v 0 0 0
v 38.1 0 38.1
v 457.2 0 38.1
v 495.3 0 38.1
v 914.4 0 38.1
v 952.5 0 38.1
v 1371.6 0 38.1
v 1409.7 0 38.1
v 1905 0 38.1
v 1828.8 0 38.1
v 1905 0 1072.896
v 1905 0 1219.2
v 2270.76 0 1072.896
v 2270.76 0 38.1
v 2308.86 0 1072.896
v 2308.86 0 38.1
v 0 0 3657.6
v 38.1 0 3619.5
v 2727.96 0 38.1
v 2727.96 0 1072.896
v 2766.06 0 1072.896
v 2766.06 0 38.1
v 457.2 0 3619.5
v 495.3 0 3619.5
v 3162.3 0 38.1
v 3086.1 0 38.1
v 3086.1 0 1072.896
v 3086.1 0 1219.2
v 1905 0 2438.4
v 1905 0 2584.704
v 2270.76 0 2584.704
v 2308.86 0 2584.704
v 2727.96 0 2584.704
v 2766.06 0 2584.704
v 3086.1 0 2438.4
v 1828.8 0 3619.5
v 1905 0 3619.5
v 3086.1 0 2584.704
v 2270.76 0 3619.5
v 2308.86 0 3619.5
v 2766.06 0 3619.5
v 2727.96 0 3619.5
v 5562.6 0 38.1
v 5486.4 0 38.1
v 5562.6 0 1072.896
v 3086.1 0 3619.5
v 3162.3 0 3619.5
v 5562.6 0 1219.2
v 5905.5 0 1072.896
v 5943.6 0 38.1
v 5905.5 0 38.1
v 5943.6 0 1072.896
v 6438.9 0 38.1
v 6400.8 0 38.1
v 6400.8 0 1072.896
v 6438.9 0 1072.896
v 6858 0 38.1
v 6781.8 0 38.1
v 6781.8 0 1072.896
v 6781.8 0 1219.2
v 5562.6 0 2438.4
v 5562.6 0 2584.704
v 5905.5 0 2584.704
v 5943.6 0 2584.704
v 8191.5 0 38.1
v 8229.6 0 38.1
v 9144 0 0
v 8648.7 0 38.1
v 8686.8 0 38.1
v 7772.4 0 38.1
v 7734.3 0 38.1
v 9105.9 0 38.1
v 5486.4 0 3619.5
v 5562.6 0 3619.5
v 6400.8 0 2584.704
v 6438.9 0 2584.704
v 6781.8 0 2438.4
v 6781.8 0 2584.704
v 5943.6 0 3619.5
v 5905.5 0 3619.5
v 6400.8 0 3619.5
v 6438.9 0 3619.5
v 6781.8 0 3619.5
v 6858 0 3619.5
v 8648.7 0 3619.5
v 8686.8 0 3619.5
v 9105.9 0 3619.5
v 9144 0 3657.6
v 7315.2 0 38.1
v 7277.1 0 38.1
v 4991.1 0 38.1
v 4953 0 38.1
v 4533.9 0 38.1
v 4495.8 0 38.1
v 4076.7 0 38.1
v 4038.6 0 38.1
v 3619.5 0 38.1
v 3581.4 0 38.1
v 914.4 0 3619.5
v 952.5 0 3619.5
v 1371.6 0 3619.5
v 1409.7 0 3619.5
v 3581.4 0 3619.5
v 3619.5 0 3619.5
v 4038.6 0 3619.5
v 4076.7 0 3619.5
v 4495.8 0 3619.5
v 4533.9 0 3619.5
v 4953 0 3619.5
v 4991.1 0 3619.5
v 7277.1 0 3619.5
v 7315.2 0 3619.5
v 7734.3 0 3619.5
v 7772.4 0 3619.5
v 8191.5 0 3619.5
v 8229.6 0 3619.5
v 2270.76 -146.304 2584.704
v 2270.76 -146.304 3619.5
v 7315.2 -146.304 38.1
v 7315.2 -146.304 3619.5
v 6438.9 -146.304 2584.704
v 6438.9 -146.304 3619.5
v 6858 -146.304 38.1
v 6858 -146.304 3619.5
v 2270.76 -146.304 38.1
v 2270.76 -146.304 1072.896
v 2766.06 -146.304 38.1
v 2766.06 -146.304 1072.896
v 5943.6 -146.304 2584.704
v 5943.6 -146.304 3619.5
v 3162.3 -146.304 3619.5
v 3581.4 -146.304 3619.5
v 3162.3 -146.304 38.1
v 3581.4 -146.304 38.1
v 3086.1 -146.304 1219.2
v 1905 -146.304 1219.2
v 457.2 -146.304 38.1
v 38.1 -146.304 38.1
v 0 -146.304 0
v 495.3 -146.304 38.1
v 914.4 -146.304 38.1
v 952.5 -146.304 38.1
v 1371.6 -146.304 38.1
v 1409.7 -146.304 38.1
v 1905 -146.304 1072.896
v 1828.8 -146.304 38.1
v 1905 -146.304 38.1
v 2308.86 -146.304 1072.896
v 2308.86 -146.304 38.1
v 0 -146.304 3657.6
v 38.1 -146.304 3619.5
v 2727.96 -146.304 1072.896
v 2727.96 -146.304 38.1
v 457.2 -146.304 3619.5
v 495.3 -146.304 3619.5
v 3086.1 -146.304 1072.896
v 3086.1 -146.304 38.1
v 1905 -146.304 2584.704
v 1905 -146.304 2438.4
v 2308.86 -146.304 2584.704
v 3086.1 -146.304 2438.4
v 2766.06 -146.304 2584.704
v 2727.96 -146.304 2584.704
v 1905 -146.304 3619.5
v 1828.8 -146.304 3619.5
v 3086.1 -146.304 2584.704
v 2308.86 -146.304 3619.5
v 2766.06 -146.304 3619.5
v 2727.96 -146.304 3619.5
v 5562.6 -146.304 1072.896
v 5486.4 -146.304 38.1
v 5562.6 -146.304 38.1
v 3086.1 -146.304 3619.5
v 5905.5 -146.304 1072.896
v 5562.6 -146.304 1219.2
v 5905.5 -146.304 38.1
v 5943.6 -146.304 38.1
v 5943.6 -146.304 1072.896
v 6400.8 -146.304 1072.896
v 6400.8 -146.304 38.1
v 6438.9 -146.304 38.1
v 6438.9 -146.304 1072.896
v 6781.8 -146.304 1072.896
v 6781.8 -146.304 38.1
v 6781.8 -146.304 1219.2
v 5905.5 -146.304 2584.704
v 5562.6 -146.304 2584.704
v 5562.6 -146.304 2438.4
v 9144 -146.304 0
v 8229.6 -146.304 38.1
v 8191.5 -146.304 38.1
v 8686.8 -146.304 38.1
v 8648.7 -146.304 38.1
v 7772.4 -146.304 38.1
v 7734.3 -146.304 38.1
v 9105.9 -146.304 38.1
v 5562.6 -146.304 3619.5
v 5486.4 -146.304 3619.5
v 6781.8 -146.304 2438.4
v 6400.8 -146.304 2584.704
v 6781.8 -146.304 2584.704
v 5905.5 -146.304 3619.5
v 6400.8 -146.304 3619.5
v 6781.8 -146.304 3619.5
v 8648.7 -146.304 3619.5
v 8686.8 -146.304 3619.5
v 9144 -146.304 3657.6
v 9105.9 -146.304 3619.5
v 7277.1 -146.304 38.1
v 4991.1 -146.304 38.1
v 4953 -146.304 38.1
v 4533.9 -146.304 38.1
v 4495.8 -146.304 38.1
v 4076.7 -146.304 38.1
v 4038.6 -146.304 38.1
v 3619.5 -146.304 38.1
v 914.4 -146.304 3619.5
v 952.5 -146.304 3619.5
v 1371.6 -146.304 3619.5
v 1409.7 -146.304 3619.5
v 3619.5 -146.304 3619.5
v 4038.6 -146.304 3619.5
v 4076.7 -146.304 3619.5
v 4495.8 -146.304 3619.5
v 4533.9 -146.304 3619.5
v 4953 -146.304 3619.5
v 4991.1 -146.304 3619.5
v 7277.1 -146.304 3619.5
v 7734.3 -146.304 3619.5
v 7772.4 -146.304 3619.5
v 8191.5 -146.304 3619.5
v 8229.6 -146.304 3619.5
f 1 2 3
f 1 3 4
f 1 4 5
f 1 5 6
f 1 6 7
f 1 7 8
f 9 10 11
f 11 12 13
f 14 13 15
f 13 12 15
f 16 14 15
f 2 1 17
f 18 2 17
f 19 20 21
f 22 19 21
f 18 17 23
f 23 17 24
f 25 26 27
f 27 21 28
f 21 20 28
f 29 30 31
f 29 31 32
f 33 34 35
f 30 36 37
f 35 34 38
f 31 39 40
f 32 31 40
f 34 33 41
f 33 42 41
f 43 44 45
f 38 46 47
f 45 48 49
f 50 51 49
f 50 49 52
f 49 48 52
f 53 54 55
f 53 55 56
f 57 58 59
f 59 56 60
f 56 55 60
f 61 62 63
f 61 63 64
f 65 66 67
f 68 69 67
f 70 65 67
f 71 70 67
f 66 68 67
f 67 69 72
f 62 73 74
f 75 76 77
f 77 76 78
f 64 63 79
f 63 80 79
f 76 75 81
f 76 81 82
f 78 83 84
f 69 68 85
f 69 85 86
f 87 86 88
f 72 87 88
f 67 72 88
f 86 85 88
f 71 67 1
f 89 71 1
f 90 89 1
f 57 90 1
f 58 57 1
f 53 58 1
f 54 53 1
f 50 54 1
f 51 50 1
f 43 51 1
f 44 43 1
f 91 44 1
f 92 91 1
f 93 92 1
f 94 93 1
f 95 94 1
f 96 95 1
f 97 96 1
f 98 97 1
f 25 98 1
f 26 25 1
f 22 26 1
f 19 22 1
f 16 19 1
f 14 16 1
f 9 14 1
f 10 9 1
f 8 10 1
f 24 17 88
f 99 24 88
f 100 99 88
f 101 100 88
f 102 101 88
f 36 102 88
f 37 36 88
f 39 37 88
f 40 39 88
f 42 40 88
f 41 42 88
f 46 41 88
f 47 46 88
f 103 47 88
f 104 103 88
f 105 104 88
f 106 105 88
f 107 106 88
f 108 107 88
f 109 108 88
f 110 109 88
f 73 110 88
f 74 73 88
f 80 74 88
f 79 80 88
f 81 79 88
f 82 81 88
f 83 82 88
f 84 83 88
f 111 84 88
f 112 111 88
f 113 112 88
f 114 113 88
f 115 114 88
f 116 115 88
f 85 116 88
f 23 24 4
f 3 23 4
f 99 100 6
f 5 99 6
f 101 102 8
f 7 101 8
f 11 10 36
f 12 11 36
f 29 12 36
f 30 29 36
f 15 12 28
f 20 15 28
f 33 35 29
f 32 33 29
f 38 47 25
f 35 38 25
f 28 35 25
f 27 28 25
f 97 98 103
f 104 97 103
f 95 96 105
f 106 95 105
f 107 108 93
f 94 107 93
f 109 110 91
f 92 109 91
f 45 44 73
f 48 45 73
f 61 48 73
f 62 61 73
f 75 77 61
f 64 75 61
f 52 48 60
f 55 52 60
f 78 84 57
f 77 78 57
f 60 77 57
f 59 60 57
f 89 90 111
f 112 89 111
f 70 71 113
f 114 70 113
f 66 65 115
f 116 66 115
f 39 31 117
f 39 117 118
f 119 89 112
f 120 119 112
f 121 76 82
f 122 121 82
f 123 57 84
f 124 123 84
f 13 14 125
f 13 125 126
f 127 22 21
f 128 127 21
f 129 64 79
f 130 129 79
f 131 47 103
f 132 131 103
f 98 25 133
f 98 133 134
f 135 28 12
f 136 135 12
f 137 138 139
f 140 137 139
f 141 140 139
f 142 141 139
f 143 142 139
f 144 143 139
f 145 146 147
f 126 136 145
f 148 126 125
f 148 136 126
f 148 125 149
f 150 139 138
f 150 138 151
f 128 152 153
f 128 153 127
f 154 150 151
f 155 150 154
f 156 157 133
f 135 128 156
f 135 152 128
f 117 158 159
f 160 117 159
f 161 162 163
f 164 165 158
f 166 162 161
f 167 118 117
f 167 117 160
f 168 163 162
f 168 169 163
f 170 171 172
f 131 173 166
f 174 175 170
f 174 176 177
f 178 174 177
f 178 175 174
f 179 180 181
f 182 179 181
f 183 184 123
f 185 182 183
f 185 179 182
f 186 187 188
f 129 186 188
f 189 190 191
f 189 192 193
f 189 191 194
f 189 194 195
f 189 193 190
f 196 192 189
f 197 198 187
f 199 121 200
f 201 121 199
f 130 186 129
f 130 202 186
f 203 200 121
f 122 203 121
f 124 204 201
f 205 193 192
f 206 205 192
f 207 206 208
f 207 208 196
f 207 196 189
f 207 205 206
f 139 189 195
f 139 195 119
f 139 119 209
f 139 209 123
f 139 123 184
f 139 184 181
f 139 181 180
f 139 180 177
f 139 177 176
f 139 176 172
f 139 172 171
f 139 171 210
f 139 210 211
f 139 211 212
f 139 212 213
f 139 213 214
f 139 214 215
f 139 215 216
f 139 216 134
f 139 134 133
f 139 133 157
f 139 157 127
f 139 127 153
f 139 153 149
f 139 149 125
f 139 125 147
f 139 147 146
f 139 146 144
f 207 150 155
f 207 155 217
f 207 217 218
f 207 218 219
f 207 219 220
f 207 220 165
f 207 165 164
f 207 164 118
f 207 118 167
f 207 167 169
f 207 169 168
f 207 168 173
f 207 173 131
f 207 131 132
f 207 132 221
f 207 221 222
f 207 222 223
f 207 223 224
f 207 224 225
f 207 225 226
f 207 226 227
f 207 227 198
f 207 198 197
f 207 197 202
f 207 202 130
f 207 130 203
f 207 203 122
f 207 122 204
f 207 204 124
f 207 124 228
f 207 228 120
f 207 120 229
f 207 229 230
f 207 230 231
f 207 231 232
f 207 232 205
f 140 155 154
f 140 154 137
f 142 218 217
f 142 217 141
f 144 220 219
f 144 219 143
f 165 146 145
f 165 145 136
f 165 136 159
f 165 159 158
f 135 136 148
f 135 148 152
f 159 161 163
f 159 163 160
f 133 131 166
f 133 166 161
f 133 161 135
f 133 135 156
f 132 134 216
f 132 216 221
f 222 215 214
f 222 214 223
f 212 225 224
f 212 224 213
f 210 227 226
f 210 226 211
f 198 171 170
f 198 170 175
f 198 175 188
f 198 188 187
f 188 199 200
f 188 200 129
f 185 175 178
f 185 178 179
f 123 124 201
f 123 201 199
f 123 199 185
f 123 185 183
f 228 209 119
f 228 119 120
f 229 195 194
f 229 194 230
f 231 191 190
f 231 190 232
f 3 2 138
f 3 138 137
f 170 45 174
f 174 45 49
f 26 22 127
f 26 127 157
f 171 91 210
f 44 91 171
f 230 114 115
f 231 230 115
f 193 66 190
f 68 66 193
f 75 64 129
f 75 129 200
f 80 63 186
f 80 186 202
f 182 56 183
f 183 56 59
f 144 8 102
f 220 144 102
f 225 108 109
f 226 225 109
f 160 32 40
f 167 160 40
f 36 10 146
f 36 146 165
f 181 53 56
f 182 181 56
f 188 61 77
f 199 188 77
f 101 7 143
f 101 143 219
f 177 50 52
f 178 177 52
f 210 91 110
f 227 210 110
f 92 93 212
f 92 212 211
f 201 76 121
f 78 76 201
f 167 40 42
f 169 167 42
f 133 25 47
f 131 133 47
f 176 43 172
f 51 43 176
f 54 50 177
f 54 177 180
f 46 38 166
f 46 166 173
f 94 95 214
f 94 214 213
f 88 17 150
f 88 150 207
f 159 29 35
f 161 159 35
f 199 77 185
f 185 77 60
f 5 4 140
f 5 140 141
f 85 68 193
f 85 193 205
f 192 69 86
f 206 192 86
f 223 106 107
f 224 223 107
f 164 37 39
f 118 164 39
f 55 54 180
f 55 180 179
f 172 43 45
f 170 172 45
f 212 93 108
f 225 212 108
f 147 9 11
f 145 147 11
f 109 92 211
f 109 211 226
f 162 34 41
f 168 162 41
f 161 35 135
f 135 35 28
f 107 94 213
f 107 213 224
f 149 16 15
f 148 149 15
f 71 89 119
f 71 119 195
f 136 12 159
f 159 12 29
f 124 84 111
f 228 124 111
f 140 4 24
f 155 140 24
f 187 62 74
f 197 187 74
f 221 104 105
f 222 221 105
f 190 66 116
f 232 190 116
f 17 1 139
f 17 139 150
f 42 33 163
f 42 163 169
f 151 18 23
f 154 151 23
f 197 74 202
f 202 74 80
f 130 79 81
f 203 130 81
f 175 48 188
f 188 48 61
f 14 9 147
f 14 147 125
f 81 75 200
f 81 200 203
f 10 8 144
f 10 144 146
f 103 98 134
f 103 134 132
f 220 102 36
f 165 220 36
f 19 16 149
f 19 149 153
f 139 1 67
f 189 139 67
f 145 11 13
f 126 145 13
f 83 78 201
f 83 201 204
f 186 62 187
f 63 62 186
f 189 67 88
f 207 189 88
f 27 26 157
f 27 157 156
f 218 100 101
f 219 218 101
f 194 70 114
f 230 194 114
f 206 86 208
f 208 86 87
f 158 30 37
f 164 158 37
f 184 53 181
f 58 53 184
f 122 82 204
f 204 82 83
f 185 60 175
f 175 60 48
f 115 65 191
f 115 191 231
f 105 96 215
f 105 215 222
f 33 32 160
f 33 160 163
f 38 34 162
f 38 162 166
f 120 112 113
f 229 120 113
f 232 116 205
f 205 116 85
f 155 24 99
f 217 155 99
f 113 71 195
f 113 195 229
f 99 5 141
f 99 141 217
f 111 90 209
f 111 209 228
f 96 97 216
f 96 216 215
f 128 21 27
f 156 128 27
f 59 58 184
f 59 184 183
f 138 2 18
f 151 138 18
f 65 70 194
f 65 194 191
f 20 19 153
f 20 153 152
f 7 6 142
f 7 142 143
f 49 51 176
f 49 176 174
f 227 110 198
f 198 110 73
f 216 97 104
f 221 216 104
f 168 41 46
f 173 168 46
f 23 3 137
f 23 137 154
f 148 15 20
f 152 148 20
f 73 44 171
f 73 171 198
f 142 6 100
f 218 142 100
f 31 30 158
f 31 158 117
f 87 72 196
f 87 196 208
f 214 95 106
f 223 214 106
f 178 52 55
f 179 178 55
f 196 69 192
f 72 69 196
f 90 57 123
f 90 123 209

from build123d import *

# Parameters (mm, degrees)
F0_W     = 9144
F0_H     = 3657.6
F0_W_2   = 365.76
F0_H_2   = 1034.796
F0_W_3   = 419.1
F0_W_4   = 320.04
F0_W_5   = 342.9
F0_W_6   = 457.2
F0_H_3   = 3581.4
F0_W_7   = 495.3
F1_DEPTH = 146.304


with BuildPart() as f1:
    # F0 (on Front) → F1 (new body)
    with BuildSketch(Plane.XZ):
        with Locations((4572, 1828.8)):
            Rectangle(F0_W, F0_H)
        with Locations((2087.88, 555.498)):
            Rectangle(F0_W_2, F0_H_2, mode=Mode.SUBTRACT)
        with Locations((2518.41, 555.498)):
            Rectangle(F0_W_3, F0_H_2, mode=Mode.SUBTRACT)
        with Locations((2926.08, 555.498)):
            Rectangle(F0_W_4, F0_H_2, mode=Mode.SUBTRACT)
        with Locations((5734.05, 555.498)):
            Rectangle(F0_W_5, F0_H_2, mode=Mode.SUBTRACT)
        with Locations((6172.2, 555.498)):
            Rectangle(F0_W_6, F0_H_2, mode=Mode.SUBTRACT)
        with Locations((6610.35, 555.498)):
            Rectangle(F0_W_5, F0_H_2, mode=Mode.SUBTRACT)
        with Locations((247.65, 1828.8)):
            Rectangle(F0_W_3, F0_H_3, mode=Mode.SUBTRACT)
        with Locations((704.85, 1828.8)):
            Rectangle(F0_W_3, F0_H_3, mode=Mode.SUBTRACT)
        with Locations((1162.05, 1828.8)):
            Rectangle(F0_W_3, F0_H_3, mode=Mode.SUBTRACT)
        with Locations((1619.25, 1828.8)):
            Rectangle(F0_W_3, F0_H_3, mode=Mode.SUBTRACT)
        Polygon((1905, 1219.2), (1905, 2438.4), (2270.76, 2438.4), (2727.96, 2438.4), (2766.06, 2438.4), (3086.1, 2438.4), (3086.1, 1219.2), (2766.06, 1219.2), (2727.96, 1219.2), (2308.86, 1219.2), align=None, mode=Mode.SUBTRACT)
        with Locations((3371.85, 1828.8)):
            Rectangle(F0_W_3, F0_H_3, mode=Mode.SUBTRACT)
        with Locations((3829.05, 1828.8)):
            Rectangle(F0_W_3, F0_H_3, mode=Mode.SUBTRACT)
        with Locations((4286.25, 1828.8)):
            Rectangle(F0_W_3, F0_H_3, mode=Mode.SUBTRACT)
        with Locations((2087.88, 3102.102)):
            Rectangle(F0_W_2, F0_H_2, mode=Mode.SUBTRACT)
        with Locations((2518.41, 3102.102)):
            Rectangle(F0_W_3, F0_H_2, mode=Mode.SUBTRACT)
        with Locations((2926.08, 3102.102)):
            Rectangle(F0_W_4, F0_H_2, mode=Mode.SUBTRACT)
        with Locations((4743.45, 1828.8)):
            Rectangle(F0_W_3, F0_H_3, mode=Mode.SUBTRACT)
        with Locations((5238.75, 1828.8)):
            Rectangle(F0_W_7, F0_H_3, mode=Mode.SUBTRACT)
        Polygon((5562.6, 2438.4), (5852.16, 2438.4), (5890.26, 2438.4), (6781.8, 2438.4), (6781.8, 1219.2), (5562.6, 1219.2), align=None, mode=Mode.SUBTRACT)
        with Locations((7067.55, 1828.8)):
            Rectangle(F0_W_3, F0_H_3, mode=Mode.SUBTRACT)
        with Locations((7524.75, 1828.8)):
            Rectangle(F0_W_3, F0_H_3, mode=Mode.SUBTRACT)
        with Locations((7981.95, 1828.8)):
            Rectangle(F0_W_3, F0_H_3, mode=Mode.SUBTRACT)
        with Locations((8439.15, 1828.8)):
            Rectangle(F0_W_3, F0_H_3, mode=Mode.SUBTRACT)
        with Locations((8896.35, 1828.8)):
            Rectangle(F0_W_3, F0_H_3, mode=Mode.SUBTRACT)
        with Locations((5734.05, 3102.102)):
            Rectangle(F0_W_5, F0_H_2, mode=Mode.SUBTRACT)
        with Locations((6172.2, 3102.102)):
            Rectangle(F0_W_6, F0_H_2, mode=Mode.SUBTRACT)
        with Locations((6610.35, 3102.102)):
            Rectangle(F0_W_5, F0_H_2, mode=Mode.SUBTRACT)
    extrude(amount=F1_DEPTH)


solid = f1.part
